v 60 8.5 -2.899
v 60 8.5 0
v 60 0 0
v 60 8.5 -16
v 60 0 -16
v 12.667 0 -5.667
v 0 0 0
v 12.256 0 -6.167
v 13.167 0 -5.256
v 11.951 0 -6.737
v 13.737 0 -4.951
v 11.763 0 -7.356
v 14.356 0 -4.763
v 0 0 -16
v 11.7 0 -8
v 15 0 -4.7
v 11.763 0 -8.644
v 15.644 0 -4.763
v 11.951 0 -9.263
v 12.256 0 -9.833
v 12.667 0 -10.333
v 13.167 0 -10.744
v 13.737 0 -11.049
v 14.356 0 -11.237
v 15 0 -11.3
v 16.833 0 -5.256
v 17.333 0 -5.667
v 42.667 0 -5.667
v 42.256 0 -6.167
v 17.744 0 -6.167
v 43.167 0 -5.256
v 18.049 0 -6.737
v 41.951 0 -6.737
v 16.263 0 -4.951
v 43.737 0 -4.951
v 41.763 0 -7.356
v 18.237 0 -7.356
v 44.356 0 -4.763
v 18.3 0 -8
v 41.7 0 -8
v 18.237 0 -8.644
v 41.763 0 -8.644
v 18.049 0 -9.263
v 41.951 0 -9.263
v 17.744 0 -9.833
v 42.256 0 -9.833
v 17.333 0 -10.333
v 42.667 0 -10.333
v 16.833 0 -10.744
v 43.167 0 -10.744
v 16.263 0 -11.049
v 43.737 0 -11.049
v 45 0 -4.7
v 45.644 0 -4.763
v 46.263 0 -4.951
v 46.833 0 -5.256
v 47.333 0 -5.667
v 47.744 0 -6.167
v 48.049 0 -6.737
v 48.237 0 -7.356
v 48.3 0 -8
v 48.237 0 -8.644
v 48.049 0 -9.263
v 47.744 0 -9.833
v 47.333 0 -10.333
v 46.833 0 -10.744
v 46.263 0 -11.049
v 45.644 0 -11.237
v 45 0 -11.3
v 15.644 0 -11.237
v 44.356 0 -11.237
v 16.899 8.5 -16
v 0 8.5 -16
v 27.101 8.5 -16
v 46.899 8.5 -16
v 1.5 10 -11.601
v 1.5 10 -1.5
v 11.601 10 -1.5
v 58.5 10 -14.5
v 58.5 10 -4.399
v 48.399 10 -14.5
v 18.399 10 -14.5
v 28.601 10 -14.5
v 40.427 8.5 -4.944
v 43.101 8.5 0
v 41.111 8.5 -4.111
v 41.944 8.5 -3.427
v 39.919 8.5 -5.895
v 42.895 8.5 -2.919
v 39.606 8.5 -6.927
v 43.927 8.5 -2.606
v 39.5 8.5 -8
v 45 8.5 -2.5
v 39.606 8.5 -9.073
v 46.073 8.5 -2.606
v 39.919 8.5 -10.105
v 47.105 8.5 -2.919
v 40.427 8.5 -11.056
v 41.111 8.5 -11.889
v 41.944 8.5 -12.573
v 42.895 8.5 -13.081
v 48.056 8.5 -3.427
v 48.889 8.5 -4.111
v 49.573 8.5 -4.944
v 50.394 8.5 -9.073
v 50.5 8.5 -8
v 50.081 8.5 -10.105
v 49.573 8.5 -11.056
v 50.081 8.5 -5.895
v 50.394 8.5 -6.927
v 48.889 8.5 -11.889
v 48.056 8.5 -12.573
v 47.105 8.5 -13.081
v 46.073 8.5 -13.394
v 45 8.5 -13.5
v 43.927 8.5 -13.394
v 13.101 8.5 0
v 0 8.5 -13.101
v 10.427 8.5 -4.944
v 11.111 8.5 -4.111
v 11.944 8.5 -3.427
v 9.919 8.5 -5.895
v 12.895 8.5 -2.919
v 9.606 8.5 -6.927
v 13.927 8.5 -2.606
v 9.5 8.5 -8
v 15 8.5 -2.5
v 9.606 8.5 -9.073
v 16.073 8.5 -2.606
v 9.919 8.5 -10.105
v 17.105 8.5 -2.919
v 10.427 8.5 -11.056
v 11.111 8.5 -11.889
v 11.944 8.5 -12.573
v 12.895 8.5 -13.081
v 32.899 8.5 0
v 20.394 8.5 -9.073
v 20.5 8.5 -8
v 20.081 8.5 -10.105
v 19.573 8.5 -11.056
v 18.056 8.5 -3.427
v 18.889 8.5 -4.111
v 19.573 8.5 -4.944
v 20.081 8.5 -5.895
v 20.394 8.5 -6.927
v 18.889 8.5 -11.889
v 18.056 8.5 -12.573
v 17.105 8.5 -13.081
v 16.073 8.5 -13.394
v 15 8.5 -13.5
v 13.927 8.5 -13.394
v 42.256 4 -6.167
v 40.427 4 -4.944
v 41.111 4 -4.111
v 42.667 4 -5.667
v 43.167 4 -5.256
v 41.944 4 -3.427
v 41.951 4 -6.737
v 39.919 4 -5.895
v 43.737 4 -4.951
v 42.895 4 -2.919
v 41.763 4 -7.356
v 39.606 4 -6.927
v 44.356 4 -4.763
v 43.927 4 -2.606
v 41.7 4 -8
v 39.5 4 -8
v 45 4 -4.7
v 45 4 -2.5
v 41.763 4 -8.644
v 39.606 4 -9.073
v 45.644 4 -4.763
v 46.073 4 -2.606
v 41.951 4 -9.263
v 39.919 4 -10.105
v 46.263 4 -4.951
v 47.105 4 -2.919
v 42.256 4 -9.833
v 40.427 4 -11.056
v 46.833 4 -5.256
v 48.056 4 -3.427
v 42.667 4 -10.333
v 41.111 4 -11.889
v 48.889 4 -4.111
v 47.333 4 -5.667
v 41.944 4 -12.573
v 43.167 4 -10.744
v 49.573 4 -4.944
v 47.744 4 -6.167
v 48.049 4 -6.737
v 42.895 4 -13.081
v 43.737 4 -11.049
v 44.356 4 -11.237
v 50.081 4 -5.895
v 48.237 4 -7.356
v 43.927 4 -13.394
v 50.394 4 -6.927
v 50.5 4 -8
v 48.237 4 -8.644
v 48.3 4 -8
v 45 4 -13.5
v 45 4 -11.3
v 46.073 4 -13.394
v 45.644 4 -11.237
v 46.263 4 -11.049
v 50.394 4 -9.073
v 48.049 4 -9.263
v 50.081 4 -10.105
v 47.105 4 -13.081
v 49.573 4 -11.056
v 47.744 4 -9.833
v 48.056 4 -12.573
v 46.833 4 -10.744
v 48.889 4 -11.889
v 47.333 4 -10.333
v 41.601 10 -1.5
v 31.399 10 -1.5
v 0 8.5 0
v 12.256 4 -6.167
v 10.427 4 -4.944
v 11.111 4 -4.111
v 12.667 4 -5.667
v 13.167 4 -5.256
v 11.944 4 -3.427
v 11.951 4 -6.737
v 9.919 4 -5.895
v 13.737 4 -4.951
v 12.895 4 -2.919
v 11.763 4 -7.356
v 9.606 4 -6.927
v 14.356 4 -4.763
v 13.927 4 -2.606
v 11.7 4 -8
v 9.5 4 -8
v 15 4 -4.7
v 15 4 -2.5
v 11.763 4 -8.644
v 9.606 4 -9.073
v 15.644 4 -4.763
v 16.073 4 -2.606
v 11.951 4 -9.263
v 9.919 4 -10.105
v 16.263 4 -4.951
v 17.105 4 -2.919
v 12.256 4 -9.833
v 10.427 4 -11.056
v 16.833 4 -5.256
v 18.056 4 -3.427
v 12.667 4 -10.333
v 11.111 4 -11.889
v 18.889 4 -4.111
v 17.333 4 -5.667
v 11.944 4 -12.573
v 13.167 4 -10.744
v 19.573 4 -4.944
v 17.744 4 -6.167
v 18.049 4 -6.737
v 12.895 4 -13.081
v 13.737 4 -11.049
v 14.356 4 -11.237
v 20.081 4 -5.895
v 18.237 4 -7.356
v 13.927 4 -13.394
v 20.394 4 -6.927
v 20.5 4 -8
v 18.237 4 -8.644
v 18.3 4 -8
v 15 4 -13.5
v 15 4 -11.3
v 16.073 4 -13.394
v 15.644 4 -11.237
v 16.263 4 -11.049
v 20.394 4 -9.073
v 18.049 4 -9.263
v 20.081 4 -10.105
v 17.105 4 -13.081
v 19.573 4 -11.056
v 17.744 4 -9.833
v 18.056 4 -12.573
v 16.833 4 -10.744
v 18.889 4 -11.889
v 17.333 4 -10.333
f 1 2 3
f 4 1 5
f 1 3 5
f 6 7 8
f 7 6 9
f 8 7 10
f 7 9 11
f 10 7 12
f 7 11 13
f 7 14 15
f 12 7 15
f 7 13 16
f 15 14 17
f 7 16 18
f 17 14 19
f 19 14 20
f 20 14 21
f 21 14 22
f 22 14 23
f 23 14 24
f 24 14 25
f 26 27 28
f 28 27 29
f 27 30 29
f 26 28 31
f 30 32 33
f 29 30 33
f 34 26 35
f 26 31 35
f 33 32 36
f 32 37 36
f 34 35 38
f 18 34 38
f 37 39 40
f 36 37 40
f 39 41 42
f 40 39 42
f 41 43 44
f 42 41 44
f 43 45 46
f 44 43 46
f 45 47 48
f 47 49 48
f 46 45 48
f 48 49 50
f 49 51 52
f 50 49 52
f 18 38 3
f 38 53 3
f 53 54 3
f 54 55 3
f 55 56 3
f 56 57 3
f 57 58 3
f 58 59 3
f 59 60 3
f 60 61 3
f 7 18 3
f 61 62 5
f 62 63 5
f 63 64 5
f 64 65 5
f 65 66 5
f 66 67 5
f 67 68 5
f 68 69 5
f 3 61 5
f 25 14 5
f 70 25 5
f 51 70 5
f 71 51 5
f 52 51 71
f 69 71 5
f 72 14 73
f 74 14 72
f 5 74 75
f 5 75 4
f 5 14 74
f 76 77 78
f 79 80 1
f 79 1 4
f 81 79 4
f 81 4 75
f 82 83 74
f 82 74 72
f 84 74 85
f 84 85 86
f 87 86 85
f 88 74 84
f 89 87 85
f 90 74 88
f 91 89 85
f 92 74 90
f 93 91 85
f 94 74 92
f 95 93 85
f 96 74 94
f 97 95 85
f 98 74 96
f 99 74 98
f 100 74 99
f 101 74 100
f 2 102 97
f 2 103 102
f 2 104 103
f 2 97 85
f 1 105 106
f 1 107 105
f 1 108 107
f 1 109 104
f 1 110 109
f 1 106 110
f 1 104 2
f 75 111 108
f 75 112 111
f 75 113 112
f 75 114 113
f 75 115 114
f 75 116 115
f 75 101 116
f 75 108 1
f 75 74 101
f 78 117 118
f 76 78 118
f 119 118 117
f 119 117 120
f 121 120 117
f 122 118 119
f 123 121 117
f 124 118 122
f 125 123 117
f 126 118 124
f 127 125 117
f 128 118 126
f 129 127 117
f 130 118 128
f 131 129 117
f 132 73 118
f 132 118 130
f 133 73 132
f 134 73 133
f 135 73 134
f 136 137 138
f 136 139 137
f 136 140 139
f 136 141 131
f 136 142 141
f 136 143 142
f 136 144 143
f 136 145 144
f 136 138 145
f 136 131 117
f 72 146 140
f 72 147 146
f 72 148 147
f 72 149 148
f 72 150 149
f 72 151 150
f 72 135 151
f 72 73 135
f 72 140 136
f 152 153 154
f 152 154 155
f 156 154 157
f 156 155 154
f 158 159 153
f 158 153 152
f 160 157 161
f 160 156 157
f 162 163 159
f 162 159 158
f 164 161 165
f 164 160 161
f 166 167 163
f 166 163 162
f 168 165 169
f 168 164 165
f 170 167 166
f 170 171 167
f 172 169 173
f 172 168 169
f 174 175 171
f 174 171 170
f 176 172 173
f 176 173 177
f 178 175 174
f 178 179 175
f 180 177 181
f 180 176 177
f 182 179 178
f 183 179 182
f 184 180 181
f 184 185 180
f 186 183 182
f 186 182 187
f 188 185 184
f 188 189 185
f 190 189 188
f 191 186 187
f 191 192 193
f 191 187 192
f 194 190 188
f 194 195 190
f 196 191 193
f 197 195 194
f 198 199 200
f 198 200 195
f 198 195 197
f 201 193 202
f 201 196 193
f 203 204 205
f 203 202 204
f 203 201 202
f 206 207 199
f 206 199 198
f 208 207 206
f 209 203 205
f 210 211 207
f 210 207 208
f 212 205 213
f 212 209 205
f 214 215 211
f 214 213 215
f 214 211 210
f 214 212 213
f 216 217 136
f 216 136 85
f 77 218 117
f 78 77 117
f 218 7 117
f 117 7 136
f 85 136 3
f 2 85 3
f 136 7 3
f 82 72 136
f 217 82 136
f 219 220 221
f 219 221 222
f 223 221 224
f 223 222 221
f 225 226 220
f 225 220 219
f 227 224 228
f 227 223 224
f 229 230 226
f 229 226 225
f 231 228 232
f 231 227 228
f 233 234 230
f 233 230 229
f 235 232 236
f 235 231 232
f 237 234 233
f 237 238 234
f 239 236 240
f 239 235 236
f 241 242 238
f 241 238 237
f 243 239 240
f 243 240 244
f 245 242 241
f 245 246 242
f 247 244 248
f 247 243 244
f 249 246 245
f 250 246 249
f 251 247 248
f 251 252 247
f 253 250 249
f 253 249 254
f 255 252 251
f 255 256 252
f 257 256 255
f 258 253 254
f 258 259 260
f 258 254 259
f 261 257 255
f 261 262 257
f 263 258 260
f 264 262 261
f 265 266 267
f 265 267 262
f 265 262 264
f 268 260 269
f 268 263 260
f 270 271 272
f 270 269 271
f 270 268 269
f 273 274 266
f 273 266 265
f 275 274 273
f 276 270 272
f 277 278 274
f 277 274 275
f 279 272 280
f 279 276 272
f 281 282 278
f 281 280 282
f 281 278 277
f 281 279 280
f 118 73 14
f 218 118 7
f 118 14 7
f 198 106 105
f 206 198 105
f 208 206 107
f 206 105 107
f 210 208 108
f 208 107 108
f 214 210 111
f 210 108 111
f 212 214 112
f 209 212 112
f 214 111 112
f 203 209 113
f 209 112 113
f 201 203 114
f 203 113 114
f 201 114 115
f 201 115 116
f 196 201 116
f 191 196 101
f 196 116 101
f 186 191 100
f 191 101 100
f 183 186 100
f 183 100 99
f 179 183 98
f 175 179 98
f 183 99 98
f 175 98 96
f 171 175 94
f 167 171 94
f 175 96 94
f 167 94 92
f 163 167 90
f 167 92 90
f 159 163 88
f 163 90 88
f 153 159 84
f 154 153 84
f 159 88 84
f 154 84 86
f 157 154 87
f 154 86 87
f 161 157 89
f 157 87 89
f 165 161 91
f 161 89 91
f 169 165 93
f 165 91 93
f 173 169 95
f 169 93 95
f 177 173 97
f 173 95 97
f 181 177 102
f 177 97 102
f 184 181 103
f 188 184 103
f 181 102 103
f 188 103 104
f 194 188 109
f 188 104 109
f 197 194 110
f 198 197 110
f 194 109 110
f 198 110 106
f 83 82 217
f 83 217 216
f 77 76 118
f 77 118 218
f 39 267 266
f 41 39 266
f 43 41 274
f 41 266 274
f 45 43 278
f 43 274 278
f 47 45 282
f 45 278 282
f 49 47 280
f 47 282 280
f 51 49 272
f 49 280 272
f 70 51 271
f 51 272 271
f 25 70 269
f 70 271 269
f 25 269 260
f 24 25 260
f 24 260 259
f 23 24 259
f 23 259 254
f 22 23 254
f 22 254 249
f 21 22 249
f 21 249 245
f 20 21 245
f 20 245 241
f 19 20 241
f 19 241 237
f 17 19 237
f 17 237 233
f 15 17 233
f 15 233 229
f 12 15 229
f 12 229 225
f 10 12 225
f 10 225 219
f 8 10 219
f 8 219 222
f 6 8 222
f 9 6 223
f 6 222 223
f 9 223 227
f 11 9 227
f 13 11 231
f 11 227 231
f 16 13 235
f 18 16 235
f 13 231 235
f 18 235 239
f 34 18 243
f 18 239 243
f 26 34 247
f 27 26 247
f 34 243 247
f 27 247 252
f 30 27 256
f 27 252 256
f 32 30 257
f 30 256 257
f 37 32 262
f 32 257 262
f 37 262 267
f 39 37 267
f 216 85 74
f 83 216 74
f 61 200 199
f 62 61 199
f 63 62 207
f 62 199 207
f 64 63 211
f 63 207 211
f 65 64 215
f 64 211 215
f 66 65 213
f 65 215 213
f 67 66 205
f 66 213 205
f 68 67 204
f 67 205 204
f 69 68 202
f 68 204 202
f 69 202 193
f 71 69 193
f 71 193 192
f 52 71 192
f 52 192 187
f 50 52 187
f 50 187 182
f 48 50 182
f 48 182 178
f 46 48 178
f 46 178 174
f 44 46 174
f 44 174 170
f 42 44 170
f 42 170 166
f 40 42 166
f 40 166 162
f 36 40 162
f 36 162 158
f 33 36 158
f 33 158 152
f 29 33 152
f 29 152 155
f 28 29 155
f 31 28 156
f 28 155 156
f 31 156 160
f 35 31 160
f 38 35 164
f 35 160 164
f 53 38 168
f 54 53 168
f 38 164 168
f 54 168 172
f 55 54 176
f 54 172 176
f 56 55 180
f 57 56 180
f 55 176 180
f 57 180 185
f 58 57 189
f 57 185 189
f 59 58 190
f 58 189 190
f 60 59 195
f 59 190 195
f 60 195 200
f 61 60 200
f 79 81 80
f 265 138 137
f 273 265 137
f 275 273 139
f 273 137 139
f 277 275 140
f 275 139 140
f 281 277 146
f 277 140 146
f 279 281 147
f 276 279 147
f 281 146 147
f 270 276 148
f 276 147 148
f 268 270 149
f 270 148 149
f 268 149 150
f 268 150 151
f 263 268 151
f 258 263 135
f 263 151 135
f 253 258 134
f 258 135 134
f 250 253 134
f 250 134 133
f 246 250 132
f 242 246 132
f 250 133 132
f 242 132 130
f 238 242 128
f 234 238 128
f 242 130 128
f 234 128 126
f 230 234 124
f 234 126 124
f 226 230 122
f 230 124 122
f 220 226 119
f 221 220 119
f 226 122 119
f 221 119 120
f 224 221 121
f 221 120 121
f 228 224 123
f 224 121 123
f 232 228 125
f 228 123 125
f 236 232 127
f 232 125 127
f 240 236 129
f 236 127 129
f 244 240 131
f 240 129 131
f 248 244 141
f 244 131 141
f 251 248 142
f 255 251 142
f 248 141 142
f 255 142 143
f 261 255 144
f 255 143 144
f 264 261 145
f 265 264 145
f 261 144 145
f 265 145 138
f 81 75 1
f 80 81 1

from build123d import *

# Parameters (mm, degrees)
SKETCH_1_W          = 60
SKETCH_1_H          = 16
EXTRUDE_1_DEPTH     = 8.5
SKETCH_2_R          = 5.5
CUT_EXTRUDE_1_DEPTH = 4.5
EXTRUDE_2_DEPTH     = 1.5
SKETCH_3_R          = 3.3
CUT_EXTRUDE_2_DEPTH = 5
CHAMFER_1_SIZE      = 1.5


with BuildPart() as part:
    # 草图1 → 凸台-拉伸1 (new body)
    with BuildSketch(Plane(origin=(0, 0, 0), x_dir=(1, 0, 0), z_dir=(0, 1, 0))):
        with Locations((30, 8)):
            Rectangle(SKETCH_1_W, SKETCH_1_H)
    extrude(amount=EXTRUDE_1_DEPTH)

    # 草图2 → 切除-拉伸1 (cut)
    with BuildSketch(Plane(origin=(0, 8.5, 0), x_dir=(1, 0, 0), z_dir=(0, 1, 0))):
        with Locations((15, 8)):
            Circle(SKETCH_2_R)
        with Locations((45, 8)):
            Circle(SKETCH_2_R)
    extrude(amount=-CUT_EXTRUDE_1_DEPTH, mode=Mode.SUBTRACT)

    # 草图2<3> → 凸台-拉伸2 (add)
    with BuildSketch(Plane(origin=(0, 8.5, 0), x_dir=(1, 0, 0), z_dir=(0, 1, 0))):
        Polygon((0, 13.100505063), (0, 0), (13.100505063, 0), align=None)
        Polygon((16.899494937, 16), (32.899494937, 0), (43.100505063, 0), (27.100505063, 16), align=None)
        Polygon((46.899494937, 16), (60, 2.899494937), (60, 16), align=None)
    extrude(amount=EXTRUDE_2_DEPTH)

    # 草图3 → 切除-拉伸2 (cut, through all)
    with BuildSketch(Plane(origin=(0, 4, 0), x_dir=(1, 0, 0), z_dir=(0, 1, 0))):
        with Locations((15, 8)):
            Circle(SKETCH_3_R)
        with Locations((45, 8)):
            Circle(SKETCH_3_R)
    extrude(amount=-CUT_EXTRUDE_2_DEPTH, mode=Mode.SUBTRACT)

    # 倒角1
    chamfer_1_edges = [part.edges().sort_by_distance(p)[0] for p in [
        (6.550252532, 10, 0),
        (0, 10, -6.550252532),
        (22, 10, -16),
        (38, 10, 0),
        (60, 10, -9.449747468),
        (53.449747468, 10, -16),
    ]]
    chamfer(chamfer_1_edges, length=CHAMFER_1_SIZE)


solid = part.part
